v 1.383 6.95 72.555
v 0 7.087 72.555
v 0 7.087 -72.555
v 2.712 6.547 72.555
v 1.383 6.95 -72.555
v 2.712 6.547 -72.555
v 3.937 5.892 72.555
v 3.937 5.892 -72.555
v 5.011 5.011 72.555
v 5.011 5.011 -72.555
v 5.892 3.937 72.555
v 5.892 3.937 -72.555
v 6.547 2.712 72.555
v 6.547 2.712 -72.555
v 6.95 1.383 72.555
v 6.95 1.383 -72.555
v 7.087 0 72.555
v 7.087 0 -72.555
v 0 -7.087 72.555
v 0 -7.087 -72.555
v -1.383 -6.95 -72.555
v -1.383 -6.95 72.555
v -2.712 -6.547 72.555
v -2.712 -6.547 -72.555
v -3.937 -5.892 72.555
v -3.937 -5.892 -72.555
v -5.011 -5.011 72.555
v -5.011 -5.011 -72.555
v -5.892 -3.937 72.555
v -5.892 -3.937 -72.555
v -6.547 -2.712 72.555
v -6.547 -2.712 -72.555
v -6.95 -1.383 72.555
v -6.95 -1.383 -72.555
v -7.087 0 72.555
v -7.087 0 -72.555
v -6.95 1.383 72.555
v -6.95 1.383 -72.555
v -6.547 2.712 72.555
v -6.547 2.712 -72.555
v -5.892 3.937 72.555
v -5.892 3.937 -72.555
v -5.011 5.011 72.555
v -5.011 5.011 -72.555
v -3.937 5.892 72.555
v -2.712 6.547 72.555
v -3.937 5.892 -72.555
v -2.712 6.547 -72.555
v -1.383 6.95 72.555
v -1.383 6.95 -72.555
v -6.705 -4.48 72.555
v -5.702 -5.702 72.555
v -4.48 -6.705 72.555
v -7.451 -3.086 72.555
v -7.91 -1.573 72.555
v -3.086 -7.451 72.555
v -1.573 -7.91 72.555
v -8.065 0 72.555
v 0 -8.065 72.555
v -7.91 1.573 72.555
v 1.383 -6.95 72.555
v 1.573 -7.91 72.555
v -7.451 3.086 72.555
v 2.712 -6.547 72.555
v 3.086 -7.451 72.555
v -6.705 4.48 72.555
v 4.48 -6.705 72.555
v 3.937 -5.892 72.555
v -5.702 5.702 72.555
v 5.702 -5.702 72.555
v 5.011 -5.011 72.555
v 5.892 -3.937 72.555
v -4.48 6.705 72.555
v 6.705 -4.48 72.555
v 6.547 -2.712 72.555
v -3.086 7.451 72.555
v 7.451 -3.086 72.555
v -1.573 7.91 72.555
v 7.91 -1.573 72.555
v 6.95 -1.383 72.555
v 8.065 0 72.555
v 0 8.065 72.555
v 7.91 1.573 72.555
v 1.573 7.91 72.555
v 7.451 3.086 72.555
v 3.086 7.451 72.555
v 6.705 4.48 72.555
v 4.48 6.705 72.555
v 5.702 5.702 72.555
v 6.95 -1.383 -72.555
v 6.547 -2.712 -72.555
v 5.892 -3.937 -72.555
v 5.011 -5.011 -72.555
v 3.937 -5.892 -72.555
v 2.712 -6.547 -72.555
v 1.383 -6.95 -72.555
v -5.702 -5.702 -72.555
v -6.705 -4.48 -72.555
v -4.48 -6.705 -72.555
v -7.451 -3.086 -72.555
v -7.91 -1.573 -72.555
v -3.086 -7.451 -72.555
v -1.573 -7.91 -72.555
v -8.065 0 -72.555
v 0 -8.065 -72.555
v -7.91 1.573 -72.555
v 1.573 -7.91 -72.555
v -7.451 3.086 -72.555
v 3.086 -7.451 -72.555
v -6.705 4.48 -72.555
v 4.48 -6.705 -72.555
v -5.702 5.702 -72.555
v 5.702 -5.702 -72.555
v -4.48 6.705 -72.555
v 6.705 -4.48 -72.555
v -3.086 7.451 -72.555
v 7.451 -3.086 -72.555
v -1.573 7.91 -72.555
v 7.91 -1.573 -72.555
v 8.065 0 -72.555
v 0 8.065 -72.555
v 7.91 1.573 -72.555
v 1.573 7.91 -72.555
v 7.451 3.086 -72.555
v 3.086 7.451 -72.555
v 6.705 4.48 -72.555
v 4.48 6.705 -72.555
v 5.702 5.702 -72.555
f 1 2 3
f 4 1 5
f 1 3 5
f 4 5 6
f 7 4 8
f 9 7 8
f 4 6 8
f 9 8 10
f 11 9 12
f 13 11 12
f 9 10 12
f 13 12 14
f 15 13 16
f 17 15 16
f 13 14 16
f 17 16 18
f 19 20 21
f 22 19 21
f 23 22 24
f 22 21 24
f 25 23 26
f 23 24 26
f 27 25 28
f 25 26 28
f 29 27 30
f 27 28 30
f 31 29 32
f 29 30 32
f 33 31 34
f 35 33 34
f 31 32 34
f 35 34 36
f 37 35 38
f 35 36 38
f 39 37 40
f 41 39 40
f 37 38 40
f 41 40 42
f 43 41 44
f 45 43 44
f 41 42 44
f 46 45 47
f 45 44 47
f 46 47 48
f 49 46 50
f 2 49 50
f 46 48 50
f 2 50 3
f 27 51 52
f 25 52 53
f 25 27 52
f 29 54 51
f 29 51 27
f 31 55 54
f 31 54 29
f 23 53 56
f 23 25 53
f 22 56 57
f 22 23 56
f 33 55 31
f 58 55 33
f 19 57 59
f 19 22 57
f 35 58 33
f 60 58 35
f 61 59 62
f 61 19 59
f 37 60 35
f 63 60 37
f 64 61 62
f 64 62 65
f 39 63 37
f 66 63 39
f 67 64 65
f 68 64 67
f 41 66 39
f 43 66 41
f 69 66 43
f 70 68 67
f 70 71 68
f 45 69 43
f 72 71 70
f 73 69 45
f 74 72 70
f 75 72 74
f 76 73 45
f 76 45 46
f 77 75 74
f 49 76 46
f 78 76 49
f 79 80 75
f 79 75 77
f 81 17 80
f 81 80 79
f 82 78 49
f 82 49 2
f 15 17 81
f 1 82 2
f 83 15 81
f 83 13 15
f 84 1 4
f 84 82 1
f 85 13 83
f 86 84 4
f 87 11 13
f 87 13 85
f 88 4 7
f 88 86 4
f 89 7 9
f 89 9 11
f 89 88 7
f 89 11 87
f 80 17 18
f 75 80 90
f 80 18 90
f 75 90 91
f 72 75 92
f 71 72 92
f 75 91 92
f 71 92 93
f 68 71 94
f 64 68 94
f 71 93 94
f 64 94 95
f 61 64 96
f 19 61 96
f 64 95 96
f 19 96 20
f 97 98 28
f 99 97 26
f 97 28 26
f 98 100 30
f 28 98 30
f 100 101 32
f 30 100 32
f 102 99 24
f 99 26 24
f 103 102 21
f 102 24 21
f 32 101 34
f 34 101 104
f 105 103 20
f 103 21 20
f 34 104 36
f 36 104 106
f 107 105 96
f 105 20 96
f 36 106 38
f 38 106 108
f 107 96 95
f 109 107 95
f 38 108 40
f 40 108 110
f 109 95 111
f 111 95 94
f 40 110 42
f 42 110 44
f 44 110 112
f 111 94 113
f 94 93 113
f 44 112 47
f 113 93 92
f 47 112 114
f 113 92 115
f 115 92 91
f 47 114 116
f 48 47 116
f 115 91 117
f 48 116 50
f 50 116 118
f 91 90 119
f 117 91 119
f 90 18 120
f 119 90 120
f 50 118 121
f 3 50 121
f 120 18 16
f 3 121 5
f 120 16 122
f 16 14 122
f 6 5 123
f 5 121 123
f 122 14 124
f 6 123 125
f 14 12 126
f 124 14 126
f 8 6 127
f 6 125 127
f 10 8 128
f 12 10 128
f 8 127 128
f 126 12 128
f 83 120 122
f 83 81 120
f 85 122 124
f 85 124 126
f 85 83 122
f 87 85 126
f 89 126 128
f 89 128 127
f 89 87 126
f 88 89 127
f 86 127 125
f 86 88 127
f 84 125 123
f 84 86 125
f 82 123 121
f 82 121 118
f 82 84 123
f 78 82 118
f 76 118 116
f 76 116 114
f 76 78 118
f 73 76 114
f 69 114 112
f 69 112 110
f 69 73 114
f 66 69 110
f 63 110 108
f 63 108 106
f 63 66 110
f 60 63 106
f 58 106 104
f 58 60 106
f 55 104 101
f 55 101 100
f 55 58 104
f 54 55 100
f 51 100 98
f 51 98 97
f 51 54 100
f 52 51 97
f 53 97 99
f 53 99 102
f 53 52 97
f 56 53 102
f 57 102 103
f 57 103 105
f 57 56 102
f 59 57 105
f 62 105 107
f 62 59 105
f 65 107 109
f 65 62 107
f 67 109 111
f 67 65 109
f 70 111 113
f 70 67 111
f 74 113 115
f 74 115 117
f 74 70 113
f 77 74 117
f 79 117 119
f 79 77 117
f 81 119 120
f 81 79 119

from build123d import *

# Parameters (mm, degrees)
F0_R     = 8.0645
F1_DEPTH = 72.5551
F2_DEPTH = 72.5551
F3_DEPTH = 25.4
F5_DEPTH = 145.1102


with BuildPart() as f1:
    # F0 (on Top) → F1 (new body)
    with BuildSketch(Plane.XY):
        Circle(F0_R)
    extrude(amount=F1_DEPTH)

    # F0 (on Top) → F2 (join)
    with BuildSketch(Plane.XY):
        Circle(F0_R)
    extrude(amount=-F2_DEPTH)

    # F0 (on Top) → F3 (join)
    with BuildSketch(Plane.XY):
        Circle(F0_R)
    extrude(amount=F3_DEPTH)

    # F4 (on face) → F5 (cut)
    with BuildSketch(Plane(origin=(0, 0, -72.5551), x_dir=(1, 0, 0), z_dir=(0, 0, -1))):
        with BuildLine():
            Line((0, -7.0866), (0, 7.0866))
            ThreePointArc((0, 7.0866), (-7.0866, 0), (0, -7.0866))
        make_face()
        with BuildLine():
            ThreePointArc((0, -7.0866), (5.010983, -5.010983), (7.0866, 0))
            ThreePointArc((7.0866, 0), (5.010983, 5.010983), (0, 7.0866))
            Line((0, 7.0866), (0, -7.0866))
        make_face()
    extrude(amount=-F5_DEPTH, mode=Mode.SUBTRACT)


solid = f1.part
